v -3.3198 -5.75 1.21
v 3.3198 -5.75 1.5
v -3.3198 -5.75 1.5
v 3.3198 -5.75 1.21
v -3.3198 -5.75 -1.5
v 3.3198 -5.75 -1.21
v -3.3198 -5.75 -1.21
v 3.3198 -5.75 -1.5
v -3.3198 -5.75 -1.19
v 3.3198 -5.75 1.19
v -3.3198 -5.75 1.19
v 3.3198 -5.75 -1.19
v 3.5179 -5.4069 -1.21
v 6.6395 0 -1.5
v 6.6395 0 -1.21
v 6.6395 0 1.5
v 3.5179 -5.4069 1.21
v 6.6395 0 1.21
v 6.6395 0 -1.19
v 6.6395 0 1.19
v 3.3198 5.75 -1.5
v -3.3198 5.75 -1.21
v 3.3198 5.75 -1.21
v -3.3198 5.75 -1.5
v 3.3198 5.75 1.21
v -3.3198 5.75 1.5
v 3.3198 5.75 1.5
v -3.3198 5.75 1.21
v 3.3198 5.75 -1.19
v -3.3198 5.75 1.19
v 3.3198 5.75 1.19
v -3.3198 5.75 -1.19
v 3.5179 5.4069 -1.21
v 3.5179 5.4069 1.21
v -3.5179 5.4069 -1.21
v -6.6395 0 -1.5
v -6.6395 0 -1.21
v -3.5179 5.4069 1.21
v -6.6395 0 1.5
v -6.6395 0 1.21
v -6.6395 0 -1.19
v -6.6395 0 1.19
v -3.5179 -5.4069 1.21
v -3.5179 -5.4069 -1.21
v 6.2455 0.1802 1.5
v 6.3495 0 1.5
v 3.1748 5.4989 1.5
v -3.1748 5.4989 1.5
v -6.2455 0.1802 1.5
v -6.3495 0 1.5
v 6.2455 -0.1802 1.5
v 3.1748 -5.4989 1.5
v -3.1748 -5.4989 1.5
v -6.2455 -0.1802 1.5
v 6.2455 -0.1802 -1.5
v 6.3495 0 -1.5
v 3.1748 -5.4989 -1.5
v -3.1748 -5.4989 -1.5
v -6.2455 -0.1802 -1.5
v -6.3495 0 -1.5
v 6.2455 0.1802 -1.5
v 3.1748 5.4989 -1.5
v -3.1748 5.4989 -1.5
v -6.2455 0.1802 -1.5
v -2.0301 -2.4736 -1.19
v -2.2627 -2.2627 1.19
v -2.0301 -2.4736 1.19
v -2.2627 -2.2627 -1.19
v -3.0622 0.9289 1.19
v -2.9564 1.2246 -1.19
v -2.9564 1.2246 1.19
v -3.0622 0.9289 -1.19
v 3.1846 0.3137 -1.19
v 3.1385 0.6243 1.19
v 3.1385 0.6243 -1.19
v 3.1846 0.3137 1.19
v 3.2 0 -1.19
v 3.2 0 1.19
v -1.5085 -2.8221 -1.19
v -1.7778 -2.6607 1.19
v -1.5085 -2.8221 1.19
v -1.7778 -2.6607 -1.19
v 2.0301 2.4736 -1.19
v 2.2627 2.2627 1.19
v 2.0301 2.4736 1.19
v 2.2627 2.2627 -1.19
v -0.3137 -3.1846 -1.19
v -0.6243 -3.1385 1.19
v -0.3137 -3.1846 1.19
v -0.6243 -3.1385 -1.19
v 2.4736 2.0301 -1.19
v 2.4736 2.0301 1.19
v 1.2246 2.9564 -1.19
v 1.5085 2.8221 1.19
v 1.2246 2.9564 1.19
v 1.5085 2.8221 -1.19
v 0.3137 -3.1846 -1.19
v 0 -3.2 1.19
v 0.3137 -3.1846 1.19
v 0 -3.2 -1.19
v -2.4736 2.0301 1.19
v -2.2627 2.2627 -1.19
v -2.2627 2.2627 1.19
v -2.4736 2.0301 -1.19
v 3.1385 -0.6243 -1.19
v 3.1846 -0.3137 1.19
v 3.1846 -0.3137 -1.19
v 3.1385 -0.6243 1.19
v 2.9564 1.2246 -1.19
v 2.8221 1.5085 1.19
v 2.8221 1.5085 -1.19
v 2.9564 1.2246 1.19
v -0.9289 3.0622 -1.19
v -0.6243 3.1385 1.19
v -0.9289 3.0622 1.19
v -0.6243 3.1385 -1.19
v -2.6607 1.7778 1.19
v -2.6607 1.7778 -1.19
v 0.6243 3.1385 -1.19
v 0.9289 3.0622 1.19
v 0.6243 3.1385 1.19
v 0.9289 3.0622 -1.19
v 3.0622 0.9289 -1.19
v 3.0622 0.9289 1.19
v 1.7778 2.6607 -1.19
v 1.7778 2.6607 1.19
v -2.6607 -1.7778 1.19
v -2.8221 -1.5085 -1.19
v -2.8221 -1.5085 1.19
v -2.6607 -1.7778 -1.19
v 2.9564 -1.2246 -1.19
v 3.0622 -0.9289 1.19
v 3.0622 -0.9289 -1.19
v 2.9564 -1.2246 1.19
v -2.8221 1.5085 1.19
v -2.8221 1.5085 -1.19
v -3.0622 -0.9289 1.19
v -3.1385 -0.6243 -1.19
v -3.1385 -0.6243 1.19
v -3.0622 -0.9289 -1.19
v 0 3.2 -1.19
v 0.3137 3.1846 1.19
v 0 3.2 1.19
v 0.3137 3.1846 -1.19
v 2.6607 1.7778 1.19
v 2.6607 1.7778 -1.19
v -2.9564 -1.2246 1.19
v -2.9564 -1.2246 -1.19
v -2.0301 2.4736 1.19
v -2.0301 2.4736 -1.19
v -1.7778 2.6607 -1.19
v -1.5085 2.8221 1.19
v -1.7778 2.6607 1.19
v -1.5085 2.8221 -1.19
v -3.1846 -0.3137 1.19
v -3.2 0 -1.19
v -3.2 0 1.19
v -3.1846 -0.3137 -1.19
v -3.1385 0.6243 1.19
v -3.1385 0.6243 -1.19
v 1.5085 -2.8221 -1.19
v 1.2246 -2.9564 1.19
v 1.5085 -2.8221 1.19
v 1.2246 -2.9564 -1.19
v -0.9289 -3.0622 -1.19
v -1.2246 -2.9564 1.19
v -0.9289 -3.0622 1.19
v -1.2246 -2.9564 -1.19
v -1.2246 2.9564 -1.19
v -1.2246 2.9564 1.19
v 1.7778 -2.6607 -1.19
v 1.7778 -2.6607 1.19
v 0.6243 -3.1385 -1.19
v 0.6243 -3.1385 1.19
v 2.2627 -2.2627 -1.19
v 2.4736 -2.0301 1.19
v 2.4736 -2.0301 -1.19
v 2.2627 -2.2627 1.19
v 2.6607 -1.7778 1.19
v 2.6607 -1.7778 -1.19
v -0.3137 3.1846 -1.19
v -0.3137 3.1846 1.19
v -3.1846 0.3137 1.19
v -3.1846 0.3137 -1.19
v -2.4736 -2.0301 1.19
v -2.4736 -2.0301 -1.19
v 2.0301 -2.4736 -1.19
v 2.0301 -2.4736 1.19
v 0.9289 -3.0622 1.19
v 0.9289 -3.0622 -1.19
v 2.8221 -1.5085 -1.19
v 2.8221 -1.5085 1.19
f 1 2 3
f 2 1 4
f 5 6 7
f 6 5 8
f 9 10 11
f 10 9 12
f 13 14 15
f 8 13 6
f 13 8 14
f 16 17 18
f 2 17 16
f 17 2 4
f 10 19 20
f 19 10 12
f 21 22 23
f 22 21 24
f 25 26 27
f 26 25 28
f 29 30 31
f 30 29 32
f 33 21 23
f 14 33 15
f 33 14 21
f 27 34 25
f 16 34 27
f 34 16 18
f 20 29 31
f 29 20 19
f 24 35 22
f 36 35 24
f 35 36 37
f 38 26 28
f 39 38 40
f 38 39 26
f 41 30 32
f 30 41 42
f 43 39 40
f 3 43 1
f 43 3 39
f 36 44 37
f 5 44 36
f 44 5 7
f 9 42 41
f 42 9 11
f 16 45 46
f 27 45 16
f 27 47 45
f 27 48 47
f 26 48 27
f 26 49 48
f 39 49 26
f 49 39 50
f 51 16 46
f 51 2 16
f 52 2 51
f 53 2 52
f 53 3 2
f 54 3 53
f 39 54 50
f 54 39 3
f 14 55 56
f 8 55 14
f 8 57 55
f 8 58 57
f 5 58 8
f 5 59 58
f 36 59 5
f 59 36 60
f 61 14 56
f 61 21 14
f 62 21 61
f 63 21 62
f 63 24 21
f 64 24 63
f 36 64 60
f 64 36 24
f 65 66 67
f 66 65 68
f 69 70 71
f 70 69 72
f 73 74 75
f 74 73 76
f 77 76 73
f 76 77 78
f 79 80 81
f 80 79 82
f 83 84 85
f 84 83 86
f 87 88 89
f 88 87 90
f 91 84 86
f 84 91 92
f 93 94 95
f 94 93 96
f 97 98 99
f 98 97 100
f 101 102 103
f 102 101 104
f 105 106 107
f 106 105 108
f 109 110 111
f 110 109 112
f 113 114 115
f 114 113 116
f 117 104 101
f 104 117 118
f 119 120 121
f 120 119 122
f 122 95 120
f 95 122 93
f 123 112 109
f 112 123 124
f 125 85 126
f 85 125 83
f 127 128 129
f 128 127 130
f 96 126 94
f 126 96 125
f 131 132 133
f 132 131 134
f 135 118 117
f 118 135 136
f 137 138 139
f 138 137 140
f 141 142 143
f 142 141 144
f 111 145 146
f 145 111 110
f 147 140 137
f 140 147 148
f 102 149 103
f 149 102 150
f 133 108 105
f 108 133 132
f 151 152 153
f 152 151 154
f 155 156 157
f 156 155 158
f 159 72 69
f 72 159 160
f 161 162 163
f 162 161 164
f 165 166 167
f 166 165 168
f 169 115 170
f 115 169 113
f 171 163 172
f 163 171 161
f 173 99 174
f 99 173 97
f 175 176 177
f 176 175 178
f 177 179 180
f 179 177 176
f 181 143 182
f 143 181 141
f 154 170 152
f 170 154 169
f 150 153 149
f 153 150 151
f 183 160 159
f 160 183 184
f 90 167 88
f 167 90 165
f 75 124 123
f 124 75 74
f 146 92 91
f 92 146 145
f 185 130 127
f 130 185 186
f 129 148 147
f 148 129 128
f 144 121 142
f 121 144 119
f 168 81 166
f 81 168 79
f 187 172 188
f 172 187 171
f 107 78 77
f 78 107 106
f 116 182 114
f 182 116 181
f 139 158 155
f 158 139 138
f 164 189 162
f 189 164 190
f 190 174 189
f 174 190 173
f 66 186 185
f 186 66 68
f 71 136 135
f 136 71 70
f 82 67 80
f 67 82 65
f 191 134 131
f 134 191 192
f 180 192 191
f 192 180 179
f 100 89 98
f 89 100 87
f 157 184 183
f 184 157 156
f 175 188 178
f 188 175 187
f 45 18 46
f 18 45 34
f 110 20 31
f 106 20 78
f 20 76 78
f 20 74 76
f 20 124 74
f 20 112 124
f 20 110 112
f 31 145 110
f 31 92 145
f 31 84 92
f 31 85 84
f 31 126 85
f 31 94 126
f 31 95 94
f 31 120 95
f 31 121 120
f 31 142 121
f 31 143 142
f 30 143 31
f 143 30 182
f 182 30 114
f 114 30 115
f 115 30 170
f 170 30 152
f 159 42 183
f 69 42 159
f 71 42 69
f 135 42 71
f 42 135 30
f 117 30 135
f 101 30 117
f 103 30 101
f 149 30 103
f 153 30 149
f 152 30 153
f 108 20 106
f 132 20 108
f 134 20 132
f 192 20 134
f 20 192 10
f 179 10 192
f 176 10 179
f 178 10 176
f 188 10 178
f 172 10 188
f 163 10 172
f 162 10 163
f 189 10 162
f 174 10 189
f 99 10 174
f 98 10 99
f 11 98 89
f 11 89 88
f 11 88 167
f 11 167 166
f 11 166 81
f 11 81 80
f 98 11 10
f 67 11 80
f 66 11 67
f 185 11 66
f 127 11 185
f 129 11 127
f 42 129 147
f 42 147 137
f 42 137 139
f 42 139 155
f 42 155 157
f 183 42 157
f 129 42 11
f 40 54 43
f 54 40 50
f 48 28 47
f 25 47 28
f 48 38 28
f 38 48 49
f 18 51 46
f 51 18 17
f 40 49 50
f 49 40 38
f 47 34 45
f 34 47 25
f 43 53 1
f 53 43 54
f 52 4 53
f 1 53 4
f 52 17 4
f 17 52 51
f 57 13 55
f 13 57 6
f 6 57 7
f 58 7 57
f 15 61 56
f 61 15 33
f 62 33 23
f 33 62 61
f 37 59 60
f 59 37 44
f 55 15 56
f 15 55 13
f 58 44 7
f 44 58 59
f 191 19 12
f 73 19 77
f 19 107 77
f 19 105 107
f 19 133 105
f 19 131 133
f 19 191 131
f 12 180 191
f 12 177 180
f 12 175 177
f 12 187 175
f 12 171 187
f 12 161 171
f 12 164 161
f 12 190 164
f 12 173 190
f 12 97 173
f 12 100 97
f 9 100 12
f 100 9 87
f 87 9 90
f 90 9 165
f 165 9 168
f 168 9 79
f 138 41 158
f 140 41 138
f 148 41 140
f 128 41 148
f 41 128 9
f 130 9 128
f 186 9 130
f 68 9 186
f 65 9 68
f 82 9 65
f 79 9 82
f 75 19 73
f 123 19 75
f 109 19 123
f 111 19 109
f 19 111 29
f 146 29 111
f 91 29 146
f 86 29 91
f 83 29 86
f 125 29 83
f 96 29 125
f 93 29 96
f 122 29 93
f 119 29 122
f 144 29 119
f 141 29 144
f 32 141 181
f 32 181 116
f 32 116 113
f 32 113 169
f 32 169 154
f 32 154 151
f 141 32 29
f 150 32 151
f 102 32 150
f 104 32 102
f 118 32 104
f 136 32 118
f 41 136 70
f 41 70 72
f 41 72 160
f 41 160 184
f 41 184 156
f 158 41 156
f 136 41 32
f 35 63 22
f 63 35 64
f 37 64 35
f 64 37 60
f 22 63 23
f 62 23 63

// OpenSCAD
// Hex nut for 6.0mm screws, 11.5mm across flats, 3.0mm thick
// One connected solid (nut only)

// Parameters
thread_diameter_mm = 6.0;      // screw major diameter
across_flats_mm    = 11.5;     // AF
thickness_mm       = 3.0;      // nut thickness

hole_clearance_mm  = 0.4;      // clearance for screw
chamfer_mm         = 0.3;      // edge chamfer
eps_mm             = 0.02;     // small epsilon for robust booleans

// Derived
hex_R = across_flats_mm / sqrt(3);                 // circumradius for $fn=6 gives correct across-flats
hole_r = (thread_diameter_mm + hole_clearance_mm)/2;

module hex_nut() {
    difference() {
        // Outer hex prism
        cylinder(r=hex_R, h=thickness_mm, center=true, $fn=6);

        // Through hole
        cylinder(r=hole_r, h=thickness_mm + 2*eps_mm, center=true, $fn=64);

        // Top chamfer (remove material)
        translate([0, 0, thickness_mm/2 - chamfer_mm/2])
            cylinder(r1=hex_R + eps_mm, r2=max(hex_R - chamfer_mm, 0.01),
                     h=chamfer_mm + eps_mm, center=true, $fn=6);

        // Bottom chamfer (remove material)
        translate([0, 0, -thickness_mm/2 + chamfer_mm/2])
            cylinder(r1=max(hex_R - chamfer_mm, 0.01), r2=hex_R + eps_mm,
                     h=chamfer_mm + eps_mm, center=true, $fn=6);
    }
}

hex_nut();
